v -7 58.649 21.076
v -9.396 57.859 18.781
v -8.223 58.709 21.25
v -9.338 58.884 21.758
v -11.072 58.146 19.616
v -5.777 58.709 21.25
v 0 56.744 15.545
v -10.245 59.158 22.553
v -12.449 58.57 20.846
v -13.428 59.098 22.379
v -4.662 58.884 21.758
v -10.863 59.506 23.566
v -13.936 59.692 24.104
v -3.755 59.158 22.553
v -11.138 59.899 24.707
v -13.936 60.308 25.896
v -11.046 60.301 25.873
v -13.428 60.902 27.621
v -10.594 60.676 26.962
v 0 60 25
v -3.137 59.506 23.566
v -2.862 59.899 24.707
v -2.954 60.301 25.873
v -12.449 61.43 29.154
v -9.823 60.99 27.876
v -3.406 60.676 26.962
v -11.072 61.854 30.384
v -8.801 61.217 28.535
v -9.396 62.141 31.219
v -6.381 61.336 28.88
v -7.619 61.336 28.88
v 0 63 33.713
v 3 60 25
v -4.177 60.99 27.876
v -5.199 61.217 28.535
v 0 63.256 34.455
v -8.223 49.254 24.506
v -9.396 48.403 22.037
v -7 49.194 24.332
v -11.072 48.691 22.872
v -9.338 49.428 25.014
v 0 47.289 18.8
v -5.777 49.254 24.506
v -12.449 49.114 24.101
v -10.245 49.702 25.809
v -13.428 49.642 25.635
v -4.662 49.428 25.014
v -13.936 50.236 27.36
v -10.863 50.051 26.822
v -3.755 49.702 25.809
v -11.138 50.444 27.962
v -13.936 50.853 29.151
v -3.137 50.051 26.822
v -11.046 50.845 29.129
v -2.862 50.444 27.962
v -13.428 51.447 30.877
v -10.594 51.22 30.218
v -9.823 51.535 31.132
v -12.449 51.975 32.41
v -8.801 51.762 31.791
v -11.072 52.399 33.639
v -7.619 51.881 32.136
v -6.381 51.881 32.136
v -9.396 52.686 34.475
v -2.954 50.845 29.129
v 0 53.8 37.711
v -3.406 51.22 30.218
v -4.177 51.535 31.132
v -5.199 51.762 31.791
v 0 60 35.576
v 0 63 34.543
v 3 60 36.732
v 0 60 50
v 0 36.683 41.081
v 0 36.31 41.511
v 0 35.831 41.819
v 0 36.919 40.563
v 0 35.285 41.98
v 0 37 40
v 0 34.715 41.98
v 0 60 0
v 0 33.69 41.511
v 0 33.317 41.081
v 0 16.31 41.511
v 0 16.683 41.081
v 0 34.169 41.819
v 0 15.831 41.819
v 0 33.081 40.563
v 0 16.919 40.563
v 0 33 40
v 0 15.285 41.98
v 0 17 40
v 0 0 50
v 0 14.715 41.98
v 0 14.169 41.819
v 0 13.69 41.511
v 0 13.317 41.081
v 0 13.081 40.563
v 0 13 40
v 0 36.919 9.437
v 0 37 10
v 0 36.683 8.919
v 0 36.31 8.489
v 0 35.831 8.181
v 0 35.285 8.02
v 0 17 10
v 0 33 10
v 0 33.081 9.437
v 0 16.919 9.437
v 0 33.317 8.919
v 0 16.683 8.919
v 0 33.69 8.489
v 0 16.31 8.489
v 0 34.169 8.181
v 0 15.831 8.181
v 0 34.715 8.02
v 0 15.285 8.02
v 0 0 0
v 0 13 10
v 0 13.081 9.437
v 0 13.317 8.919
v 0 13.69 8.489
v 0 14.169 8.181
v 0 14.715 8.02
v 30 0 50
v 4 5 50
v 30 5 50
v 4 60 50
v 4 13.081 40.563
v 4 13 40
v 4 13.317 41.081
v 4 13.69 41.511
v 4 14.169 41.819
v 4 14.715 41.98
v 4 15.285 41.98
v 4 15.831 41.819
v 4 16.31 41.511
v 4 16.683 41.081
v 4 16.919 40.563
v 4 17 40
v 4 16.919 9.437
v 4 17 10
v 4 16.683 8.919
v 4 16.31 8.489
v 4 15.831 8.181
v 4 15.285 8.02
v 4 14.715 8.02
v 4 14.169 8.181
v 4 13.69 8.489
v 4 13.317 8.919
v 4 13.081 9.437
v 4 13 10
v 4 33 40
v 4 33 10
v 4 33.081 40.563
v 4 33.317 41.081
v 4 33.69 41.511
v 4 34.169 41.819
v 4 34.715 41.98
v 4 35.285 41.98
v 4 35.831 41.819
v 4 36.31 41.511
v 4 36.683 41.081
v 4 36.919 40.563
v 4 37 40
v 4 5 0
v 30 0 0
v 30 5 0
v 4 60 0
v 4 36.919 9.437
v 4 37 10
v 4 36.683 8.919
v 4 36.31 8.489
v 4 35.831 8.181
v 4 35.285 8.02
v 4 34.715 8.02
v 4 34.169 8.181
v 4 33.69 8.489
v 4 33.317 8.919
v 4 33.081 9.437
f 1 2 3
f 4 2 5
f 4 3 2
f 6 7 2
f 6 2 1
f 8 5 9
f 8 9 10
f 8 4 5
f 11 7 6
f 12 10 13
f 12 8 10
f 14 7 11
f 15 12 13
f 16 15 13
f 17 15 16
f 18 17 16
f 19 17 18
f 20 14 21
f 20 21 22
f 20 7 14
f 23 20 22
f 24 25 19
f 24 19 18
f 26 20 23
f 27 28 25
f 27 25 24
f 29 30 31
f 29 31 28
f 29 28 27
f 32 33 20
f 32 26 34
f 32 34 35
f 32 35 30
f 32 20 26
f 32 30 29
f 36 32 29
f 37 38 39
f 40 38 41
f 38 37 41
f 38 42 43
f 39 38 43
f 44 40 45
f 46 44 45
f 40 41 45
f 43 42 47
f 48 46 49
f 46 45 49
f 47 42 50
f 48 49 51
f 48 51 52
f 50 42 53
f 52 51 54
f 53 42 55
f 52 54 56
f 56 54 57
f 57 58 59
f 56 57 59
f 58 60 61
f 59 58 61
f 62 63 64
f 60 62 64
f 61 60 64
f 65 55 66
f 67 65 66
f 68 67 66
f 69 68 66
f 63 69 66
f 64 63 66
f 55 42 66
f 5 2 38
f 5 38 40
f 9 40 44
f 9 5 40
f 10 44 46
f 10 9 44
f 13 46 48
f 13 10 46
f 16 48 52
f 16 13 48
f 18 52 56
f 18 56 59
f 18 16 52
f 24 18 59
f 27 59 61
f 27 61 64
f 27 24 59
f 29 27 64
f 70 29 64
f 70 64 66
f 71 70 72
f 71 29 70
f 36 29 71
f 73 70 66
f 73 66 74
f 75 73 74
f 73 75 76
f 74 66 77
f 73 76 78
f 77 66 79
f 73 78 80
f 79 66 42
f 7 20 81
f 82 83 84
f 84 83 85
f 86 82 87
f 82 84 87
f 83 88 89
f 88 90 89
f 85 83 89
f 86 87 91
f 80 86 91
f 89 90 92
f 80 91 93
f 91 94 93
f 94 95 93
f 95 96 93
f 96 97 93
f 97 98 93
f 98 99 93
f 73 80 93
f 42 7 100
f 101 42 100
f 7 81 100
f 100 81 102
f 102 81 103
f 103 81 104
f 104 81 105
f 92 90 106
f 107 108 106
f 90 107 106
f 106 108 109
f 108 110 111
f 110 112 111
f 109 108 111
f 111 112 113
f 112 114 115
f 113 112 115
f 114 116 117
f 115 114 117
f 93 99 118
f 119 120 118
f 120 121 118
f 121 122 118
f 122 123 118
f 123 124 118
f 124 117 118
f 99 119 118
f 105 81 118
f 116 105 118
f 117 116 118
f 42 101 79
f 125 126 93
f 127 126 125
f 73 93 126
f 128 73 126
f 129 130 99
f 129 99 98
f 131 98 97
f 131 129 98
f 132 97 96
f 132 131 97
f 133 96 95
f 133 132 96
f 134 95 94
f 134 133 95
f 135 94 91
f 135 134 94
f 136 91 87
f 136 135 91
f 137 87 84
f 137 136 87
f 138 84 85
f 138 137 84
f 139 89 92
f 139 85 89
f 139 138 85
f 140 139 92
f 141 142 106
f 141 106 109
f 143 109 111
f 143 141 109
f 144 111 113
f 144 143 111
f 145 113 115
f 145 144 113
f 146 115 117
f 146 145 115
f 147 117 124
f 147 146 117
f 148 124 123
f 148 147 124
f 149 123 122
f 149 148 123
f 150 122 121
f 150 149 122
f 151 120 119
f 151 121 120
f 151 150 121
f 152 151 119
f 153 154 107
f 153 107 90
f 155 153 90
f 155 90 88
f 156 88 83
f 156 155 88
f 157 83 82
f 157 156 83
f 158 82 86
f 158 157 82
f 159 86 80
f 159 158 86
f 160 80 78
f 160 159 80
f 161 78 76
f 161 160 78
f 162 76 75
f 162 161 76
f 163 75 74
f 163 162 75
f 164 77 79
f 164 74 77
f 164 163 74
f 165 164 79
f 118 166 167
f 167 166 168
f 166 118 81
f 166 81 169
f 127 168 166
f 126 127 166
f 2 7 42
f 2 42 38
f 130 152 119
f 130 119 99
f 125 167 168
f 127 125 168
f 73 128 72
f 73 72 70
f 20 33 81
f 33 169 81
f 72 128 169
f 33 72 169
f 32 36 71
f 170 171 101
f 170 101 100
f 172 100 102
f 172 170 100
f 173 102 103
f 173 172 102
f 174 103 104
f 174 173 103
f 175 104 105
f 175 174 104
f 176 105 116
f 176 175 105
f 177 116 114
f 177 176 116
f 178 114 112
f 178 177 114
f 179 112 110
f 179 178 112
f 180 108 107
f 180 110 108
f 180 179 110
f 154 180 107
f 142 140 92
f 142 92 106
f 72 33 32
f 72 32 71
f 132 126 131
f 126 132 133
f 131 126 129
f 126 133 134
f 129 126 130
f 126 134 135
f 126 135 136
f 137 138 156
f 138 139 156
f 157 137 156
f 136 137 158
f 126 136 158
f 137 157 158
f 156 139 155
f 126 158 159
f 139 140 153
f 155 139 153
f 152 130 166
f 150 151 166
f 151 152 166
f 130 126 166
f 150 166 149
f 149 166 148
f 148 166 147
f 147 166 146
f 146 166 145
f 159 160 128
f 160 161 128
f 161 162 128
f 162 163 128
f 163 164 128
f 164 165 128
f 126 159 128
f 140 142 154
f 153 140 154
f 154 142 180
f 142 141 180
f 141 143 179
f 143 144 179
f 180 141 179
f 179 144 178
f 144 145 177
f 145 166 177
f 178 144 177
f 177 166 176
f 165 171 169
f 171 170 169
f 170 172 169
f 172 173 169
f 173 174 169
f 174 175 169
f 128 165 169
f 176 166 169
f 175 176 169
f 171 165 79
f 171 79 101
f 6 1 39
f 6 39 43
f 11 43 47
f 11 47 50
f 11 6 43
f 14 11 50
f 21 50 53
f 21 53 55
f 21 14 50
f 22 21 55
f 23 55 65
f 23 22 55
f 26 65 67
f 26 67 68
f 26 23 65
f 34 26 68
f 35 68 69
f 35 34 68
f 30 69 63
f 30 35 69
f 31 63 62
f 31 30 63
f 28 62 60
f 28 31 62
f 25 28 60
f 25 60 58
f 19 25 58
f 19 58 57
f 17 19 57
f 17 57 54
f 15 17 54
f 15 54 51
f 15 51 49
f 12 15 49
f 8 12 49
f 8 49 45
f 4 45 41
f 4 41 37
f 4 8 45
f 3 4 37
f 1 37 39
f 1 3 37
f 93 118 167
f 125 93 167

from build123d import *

# Parameters (mm, degrees)
RESSALTO_EXTRUS_O1_DEPTH = 50
CORTE_EXTRUS_O1_DEPTH    = 50
F_3DSKETCH1_R            = 4.15
RESSALTO_EXTRUS_O2_DEPTH = 10
CHANFRO1_SIZE            = 3


with BuildPart() as part:
    # Esboço2 → Ressalto-extrusão1 (new body)
    with BuildSketch(Plane.XY):
        Polygon((0, 0), (30, 0), (30, 5), (4, 5), (4, 60), (0, 60), align=None)
    extrude(amount=RESSALTO_EXTRUS_O1_DEPTH)

    # Esboço3 → Corte-extrusão1 (cut)
    with BuildSketch(Plane(origin=(4, 0, 0), x_dir=(0, 0, -1), z_dir=(1, 0, 0))):
        with BuildLine():
            Line((-40, 37), (-10, 37))
            ThreePointArc((-10, 37), (-8, 35), (-10, 33))
            Line((-10, 33), (-40, 33))
            ThreePointArc((-40, 33), (-42, 35), (-40, 37))
        make_face()
        with BuildLine():
            Line((-40, 17), (-10, 17))
            ThreePointArc((-10, 17), (-8, 15), (-10, 13))
            Line((-10, 13), (-40, 13))
            ThreePointArc((-40, 13), (-42, 15), (-40, 17))
        make_face()
    extrude(amount=-CORTE_EXTRUS_O1_DEPTH, mode=Mode.SUBTRACT)

    # 3DSketch1 → Ressalto-extrusão2 (add)
    with BuildSketch(Plane(origin=(-9.395973154, 62.141320747, 31.218847007), x_dir=(0.493101437864631, -0.2832351206870136, -0.8225745184390569), z_dir=(0, -0.9455185755993176, 0.3255681544571544))):
        with BuildLine():
            Line((0, 0), (1.65541197, 9.862028757))
            Line((1.65541197, 9.862028757), (19.05484842, 0))
            Line((19.05484842, 0), (11.443924645, -6.486435022))
            ThreePointArc((11.443924645, -6.486435022), (3.451710065, -7.248591137), (0, 0))
        make_face()
        with Locations(Location((6.90342013, -1.158788379, 0), (0, 0, 330.45536526))):
            Circle(F_3DSKETCH1_R, mode=Mode.SUBTRACT)
    extrude(amount=RESSALTO_EXTRUS_O2_DEPTH)

    # Chanfro1
    chanfro1_edges = [part.edges().sort_by_distance(p)[0] for p in [
        (0, 60, 30.288103406),
    ]]
    chamfer(chanfro1_edges, length=CHANFRO1_SIZE)


solid = part.part
